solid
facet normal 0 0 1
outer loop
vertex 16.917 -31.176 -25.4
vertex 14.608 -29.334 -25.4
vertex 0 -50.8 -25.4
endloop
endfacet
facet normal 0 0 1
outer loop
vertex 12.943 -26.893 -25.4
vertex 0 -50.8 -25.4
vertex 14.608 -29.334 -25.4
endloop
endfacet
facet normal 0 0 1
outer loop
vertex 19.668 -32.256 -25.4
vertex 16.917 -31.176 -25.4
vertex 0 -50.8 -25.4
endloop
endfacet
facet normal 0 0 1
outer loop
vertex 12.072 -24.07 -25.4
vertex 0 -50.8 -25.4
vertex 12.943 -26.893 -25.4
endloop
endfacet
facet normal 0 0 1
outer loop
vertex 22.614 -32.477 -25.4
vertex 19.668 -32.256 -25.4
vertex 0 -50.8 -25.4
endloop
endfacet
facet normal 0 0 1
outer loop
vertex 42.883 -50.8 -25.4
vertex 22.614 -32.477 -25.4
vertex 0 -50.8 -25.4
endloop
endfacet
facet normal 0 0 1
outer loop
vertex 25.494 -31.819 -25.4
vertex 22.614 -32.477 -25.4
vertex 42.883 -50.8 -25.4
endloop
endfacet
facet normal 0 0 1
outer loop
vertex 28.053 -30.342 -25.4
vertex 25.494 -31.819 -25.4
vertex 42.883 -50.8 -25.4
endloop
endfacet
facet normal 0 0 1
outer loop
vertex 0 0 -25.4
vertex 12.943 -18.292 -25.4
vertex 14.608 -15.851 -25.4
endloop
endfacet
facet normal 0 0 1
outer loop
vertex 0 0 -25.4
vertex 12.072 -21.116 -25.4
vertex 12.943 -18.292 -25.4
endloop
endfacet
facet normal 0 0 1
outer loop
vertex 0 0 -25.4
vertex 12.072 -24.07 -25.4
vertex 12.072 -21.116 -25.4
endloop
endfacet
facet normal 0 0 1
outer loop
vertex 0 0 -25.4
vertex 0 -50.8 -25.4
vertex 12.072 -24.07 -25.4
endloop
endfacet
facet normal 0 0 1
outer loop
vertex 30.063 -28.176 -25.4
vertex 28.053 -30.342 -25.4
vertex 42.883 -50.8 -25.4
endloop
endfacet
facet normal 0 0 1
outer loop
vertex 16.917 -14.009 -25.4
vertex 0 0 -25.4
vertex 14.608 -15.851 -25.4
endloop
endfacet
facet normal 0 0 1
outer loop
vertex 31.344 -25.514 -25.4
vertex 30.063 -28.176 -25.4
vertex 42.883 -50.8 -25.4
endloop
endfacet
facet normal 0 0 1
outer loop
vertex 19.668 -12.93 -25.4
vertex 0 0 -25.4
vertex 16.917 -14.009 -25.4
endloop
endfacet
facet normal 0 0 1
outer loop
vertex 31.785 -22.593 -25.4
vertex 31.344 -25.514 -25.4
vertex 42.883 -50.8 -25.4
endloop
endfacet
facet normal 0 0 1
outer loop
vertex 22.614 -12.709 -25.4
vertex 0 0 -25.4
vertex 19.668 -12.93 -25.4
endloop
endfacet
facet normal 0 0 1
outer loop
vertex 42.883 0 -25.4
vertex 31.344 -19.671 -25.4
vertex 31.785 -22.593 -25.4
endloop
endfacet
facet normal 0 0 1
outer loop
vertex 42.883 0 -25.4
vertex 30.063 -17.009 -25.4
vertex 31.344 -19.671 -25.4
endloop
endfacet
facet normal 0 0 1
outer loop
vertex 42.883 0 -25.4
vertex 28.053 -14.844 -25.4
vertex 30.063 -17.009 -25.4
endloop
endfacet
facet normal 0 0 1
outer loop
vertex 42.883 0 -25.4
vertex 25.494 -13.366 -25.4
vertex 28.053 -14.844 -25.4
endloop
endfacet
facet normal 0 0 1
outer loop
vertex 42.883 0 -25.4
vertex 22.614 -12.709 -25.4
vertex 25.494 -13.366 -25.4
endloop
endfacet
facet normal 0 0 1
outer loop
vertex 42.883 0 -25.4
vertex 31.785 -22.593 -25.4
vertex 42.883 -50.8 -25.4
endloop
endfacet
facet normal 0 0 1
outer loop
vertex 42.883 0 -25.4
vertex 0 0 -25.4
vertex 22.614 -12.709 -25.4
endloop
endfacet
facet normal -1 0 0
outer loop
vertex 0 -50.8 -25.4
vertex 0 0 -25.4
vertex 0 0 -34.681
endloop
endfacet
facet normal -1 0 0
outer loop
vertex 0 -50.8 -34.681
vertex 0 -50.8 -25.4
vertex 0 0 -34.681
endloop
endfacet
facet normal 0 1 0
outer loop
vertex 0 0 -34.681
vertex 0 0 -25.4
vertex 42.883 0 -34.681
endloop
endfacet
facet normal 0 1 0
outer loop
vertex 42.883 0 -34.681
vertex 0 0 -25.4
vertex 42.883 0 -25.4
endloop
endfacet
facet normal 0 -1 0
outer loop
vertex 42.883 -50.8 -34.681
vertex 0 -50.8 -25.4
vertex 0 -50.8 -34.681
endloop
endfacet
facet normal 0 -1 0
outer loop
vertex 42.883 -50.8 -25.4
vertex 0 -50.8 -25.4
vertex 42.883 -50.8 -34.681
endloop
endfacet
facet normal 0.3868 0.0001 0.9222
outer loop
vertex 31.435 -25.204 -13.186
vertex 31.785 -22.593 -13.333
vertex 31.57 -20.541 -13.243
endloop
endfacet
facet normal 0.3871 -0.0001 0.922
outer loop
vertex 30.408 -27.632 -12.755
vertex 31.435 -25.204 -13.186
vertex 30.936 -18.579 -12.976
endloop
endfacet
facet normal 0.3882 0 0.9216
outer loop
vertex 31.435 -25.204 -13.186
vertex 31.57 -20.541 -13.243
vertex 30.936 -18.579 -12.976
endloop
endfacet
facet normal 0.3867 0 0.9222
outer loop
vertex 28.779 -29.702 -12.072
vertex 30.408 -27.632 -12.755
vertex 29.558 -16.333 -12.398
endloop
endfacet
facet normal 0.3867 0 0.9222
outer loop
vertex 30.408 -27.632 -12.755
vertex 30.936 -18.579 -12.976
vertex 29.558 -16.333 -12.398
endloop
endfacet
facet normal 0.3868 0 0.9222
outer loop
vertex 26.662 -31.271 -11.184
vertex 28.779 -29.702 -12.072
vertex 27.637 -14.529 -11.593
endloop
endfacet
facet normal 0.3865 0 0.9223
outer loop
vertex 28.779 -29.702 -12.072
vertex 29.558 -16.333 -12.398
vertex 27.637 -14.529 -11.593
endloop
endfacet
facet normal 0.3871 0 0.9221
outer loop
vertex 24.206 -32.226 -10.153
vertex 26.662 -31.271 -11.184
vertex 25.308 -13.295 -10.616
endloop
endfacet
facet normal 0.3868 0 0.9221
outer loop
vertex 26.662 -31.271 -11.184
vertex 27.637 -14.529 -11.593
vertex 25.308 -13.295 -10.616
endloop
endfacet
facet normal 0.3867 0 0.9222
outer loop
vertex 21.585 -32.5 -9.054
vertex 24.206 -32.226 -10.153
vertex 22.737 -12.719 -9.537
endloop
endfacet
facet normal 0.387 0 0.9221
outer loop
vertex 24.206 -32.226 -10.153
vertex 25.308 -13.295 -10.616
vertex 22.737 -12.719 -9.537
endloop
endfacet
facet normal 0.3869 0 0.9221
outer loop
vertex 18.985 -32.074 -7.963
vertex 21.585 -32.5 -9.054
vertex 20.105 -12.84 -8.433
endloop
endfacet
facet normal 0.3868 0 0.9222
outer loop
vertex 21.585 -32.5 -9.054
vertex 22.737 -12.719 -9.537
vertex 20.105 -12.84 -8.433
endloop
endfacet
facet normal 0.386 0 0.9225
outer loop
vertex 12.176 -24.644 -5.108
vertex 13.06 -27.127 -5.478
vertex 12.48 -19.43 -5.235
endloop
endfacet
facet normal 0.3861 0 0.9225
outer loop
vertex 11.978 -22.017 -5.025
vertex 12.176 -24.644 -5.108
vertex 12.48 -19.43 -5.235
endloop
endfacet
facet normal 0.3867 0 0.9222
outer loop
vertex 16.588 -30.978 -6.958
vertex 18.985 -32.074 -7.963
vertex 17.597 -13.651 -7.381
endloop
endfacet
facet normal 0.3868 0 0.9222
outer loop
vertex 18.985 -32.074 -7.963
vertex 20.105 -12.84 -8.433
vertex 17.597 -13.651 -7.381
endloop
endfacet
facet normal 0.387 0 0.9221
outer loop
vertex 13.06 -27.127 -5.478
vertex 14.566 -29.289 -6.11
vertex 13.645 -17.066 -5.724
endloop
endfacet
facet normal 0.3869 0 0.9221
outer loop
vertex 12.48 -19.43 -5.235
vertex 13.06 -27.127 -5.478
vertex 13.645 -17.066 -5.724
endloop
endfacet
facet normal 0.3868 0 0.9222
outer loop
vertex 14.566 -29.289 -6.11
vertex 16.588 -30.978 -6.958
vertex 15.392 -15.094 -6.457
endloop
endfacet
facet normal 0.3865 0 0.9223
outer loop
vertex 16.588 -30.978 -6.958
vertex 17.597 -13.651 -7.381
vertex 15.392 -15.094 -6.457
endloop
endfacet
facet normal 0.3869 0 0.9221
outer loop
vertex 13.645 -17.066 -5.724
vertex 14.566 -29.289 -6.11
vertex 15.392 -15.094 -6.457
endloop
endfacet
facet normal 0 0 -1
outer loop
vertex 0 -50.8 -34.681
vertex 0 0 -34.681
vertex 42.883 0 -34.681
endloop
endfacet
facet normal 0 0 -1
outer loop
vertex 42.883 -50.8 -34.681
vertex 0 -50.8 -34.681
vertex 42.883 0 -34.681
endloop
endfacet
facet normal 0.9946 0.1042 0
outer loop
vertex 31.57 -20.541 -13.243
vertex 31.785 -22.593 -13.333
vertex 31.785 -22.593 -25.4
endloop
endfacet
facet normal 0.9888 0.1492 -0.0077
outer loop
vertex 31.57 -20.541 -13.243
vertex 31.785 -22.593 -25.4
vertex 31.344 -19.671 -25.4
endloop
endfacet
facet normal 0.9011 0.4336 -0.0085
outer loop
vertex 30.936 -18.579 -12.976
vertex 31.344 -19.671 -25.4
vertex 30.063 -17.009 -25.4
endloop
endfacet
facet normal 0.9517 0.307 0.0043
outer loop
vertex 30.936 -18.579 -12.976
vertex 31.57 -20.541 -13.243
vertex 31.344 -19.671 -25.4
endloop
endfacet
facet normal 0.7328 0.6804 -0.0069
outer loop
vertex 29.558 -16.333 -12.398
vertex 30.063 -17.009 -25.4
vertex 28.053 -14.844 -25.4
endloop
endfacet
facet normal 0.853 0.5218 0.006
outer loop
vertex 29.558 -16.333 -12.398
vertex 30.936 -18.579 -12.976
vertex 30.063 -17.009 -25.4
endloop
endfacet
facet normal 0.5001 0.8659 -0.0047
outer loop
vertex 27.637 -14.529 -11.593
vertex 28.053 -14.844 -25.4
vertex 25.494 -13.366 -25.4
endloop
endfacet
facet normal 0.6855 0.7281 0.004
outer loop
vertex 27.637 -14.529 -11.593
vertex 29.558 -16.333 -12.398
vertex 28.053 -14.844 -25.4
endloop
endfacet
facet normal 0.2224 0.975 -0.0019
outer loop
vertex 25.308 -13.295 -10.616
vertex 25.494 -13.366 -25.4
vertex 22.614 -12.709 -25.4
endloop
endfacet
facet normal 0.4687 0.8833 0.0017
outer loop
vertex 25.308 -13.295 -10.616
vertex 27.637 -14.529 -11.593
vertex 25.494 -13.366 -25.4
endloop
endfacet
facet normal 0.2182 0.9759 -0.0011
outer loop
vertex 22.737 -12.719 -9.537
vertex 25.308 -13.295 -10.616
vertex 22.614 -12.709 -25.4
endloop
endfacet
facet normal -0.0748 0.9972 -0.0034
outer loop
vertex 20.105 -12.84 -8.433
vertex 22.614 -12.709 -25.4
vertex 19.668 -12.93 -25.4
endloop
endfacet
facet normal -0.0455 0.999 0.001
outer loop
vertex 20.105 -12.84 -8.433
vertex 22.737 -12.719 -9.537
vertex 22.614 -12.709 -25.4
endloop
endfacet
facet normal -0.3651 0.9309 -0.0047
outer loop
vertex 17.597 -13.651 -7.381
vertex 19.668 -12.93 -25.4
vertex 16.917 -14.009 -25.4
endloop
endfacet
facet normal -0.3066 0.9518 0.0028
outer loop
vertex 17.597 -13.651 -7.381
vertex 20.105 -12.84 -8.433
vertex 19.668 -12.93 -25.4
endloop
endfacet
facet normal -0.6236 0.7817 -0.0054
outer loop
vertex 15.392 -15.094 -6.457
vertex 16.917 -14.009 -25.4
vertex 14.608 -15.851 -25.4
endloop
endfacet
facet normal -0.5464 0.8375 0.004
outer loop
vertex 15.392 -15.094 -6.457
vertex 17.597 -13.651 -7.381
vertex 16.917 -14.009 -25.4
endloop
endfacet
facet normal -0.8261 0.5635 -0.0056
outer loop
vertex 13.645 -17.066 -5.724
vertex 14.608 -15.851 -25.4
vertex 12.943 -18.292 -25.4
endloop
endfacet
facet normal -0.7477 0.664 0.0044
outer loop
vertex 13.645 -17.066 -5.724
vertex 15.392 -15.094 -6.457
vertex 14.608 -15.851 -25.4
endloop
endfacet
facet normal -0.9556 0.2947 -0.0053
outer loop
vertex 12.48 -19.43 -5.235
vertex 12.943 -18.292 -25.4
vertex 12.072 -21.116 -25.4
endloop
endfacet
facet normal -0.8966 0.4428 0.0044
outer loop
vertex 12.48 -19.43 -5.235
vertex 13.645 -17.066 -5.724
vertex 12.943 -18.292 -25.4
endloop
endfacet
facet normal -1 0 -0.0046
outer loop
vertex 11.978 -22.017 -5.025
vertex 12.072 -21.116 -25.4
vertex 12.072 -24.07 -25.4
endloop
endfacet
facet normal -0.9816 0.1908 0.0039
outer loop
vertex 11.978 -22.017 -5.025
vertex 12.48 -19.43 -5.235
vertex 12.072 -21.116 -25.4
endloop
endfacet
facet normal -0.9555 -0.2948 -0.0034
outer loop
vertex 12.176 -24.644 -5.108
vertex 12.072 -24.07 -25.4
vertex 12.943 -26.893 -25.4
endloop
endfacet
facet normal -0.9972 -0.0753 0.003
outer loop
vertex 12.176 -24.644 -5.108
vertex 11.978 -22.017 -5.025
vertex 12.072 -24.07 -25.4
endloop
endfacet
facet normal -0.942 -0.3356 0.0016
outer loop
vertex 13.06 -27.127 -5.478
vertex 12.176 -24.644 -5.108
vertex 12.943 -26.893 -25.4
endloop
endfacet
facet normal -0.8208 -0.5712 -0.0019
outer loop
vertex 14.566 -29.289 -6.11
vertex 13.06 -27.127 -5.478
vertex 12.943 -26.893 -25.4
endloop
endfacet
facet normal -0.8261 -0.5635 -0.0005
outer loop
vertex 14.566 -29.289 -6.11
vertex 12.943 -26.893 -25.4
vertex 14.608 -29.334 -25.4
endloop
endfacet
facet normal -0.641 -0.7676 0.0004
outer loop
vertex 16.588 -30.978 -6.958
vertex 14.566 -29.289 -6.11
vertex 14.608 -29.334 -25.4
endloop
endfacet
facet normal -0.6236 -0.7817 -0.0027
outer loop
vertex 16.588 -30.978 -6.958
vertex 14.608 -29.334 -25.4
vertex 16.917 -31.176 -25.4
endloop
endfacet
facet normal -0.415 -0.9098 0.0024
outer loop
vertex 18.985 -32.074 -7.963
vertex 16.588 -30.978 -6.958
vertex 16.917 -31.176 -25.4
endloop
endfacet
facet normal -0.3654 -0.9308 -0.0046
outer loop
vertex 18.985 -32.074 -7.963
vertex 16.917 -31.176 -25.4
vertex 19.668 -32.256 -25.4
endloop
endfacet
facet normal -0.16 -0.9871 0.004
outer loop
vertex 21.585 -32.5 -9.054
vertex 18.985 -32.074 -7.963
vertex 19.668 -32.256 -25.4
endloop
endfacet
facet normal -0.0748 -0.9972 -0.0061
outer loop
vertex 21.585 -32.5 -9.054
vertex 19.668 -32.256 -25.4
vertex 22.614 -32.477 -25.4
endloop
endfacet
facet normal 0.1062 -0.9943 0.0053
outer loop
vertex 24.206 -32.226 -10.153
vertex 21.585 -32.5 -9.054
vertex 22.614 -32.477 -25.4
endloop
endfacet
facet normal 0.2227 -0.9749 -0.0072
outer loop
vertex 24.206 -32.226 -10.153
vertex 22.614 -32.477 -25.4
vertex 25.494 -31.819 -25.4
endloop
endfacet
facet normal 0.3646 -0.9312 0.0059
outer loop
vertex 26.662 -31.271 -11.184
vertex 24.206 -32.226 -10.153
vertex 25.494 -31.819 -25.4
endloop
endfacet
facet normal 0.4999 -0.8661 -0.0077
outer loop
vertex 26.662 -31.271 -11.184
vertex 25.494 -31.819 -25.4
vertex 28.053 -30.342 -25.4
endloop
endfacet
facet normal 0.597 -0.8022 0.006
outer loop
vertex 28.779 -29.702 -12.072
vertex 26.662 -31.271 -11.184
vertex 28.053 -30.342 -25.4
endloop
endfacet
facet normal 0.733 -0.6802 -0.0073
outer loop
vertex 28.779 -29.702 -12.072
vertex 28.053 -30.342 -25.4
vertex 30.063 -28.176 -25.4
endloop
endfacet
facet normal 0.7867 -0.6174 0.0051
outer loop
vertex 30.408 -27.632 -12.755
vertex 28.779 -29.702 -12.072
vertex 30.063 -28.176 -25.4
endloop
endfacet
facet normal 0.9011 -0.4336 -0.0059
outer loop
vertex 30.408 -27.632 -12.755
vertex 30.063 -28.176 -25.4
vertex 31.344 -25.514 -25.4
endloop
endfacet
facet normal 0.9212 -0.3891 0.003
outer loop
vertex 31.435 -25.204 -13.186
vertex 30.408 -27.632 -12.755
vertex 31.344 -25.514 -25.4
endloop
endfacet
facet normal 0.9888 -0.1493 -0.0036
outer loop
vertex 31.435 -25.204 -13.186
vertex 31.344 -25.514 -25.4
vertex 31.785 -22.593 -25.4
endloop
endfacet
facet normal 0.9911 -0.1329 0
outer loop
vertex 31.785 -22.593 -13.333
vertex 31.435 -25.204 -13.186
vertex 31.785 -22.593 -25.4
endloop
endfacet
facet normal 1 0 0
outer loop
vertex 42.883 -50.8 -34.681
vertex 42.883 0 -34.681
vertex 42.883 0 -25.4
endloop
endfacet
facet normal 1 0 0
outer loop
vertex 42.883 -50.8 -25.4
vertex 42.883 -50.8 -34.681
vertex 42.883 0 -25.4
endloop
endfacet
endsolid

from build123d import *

# Parameters (mm, degrees)
F1_DEPTH = 50.8
F2_W     = 61.014819
F2_H     = 64.756295
F2_R     = 9.911554
F3_DEPTH = 25.4


with BuildPart() as f1:
    # F0 (on Front) → F1 (new body)
    with BuildSketch(Plane.XZ):
        Polygon((42.883057, -17.987859), (0, 0), (0, -34.680594), (42.883057, -34.680594), align=None)
    extrude(amount=F1_DEPTH)

    # F2 (on Top) → F3 (cut)
    with BuildSketch(Plane.XY):
        with Locations((21.58543, -24.751295)):
            Rectangle(F2_W, F2_H)
        with Locations((21.873239, -22.592753)):
            Circle(F2_R, mode=Mode.SUBTRACT)
    extrude(amount=-F3_DEPTH, mode=Mode.SUBTRACT)


solid = f1.part
